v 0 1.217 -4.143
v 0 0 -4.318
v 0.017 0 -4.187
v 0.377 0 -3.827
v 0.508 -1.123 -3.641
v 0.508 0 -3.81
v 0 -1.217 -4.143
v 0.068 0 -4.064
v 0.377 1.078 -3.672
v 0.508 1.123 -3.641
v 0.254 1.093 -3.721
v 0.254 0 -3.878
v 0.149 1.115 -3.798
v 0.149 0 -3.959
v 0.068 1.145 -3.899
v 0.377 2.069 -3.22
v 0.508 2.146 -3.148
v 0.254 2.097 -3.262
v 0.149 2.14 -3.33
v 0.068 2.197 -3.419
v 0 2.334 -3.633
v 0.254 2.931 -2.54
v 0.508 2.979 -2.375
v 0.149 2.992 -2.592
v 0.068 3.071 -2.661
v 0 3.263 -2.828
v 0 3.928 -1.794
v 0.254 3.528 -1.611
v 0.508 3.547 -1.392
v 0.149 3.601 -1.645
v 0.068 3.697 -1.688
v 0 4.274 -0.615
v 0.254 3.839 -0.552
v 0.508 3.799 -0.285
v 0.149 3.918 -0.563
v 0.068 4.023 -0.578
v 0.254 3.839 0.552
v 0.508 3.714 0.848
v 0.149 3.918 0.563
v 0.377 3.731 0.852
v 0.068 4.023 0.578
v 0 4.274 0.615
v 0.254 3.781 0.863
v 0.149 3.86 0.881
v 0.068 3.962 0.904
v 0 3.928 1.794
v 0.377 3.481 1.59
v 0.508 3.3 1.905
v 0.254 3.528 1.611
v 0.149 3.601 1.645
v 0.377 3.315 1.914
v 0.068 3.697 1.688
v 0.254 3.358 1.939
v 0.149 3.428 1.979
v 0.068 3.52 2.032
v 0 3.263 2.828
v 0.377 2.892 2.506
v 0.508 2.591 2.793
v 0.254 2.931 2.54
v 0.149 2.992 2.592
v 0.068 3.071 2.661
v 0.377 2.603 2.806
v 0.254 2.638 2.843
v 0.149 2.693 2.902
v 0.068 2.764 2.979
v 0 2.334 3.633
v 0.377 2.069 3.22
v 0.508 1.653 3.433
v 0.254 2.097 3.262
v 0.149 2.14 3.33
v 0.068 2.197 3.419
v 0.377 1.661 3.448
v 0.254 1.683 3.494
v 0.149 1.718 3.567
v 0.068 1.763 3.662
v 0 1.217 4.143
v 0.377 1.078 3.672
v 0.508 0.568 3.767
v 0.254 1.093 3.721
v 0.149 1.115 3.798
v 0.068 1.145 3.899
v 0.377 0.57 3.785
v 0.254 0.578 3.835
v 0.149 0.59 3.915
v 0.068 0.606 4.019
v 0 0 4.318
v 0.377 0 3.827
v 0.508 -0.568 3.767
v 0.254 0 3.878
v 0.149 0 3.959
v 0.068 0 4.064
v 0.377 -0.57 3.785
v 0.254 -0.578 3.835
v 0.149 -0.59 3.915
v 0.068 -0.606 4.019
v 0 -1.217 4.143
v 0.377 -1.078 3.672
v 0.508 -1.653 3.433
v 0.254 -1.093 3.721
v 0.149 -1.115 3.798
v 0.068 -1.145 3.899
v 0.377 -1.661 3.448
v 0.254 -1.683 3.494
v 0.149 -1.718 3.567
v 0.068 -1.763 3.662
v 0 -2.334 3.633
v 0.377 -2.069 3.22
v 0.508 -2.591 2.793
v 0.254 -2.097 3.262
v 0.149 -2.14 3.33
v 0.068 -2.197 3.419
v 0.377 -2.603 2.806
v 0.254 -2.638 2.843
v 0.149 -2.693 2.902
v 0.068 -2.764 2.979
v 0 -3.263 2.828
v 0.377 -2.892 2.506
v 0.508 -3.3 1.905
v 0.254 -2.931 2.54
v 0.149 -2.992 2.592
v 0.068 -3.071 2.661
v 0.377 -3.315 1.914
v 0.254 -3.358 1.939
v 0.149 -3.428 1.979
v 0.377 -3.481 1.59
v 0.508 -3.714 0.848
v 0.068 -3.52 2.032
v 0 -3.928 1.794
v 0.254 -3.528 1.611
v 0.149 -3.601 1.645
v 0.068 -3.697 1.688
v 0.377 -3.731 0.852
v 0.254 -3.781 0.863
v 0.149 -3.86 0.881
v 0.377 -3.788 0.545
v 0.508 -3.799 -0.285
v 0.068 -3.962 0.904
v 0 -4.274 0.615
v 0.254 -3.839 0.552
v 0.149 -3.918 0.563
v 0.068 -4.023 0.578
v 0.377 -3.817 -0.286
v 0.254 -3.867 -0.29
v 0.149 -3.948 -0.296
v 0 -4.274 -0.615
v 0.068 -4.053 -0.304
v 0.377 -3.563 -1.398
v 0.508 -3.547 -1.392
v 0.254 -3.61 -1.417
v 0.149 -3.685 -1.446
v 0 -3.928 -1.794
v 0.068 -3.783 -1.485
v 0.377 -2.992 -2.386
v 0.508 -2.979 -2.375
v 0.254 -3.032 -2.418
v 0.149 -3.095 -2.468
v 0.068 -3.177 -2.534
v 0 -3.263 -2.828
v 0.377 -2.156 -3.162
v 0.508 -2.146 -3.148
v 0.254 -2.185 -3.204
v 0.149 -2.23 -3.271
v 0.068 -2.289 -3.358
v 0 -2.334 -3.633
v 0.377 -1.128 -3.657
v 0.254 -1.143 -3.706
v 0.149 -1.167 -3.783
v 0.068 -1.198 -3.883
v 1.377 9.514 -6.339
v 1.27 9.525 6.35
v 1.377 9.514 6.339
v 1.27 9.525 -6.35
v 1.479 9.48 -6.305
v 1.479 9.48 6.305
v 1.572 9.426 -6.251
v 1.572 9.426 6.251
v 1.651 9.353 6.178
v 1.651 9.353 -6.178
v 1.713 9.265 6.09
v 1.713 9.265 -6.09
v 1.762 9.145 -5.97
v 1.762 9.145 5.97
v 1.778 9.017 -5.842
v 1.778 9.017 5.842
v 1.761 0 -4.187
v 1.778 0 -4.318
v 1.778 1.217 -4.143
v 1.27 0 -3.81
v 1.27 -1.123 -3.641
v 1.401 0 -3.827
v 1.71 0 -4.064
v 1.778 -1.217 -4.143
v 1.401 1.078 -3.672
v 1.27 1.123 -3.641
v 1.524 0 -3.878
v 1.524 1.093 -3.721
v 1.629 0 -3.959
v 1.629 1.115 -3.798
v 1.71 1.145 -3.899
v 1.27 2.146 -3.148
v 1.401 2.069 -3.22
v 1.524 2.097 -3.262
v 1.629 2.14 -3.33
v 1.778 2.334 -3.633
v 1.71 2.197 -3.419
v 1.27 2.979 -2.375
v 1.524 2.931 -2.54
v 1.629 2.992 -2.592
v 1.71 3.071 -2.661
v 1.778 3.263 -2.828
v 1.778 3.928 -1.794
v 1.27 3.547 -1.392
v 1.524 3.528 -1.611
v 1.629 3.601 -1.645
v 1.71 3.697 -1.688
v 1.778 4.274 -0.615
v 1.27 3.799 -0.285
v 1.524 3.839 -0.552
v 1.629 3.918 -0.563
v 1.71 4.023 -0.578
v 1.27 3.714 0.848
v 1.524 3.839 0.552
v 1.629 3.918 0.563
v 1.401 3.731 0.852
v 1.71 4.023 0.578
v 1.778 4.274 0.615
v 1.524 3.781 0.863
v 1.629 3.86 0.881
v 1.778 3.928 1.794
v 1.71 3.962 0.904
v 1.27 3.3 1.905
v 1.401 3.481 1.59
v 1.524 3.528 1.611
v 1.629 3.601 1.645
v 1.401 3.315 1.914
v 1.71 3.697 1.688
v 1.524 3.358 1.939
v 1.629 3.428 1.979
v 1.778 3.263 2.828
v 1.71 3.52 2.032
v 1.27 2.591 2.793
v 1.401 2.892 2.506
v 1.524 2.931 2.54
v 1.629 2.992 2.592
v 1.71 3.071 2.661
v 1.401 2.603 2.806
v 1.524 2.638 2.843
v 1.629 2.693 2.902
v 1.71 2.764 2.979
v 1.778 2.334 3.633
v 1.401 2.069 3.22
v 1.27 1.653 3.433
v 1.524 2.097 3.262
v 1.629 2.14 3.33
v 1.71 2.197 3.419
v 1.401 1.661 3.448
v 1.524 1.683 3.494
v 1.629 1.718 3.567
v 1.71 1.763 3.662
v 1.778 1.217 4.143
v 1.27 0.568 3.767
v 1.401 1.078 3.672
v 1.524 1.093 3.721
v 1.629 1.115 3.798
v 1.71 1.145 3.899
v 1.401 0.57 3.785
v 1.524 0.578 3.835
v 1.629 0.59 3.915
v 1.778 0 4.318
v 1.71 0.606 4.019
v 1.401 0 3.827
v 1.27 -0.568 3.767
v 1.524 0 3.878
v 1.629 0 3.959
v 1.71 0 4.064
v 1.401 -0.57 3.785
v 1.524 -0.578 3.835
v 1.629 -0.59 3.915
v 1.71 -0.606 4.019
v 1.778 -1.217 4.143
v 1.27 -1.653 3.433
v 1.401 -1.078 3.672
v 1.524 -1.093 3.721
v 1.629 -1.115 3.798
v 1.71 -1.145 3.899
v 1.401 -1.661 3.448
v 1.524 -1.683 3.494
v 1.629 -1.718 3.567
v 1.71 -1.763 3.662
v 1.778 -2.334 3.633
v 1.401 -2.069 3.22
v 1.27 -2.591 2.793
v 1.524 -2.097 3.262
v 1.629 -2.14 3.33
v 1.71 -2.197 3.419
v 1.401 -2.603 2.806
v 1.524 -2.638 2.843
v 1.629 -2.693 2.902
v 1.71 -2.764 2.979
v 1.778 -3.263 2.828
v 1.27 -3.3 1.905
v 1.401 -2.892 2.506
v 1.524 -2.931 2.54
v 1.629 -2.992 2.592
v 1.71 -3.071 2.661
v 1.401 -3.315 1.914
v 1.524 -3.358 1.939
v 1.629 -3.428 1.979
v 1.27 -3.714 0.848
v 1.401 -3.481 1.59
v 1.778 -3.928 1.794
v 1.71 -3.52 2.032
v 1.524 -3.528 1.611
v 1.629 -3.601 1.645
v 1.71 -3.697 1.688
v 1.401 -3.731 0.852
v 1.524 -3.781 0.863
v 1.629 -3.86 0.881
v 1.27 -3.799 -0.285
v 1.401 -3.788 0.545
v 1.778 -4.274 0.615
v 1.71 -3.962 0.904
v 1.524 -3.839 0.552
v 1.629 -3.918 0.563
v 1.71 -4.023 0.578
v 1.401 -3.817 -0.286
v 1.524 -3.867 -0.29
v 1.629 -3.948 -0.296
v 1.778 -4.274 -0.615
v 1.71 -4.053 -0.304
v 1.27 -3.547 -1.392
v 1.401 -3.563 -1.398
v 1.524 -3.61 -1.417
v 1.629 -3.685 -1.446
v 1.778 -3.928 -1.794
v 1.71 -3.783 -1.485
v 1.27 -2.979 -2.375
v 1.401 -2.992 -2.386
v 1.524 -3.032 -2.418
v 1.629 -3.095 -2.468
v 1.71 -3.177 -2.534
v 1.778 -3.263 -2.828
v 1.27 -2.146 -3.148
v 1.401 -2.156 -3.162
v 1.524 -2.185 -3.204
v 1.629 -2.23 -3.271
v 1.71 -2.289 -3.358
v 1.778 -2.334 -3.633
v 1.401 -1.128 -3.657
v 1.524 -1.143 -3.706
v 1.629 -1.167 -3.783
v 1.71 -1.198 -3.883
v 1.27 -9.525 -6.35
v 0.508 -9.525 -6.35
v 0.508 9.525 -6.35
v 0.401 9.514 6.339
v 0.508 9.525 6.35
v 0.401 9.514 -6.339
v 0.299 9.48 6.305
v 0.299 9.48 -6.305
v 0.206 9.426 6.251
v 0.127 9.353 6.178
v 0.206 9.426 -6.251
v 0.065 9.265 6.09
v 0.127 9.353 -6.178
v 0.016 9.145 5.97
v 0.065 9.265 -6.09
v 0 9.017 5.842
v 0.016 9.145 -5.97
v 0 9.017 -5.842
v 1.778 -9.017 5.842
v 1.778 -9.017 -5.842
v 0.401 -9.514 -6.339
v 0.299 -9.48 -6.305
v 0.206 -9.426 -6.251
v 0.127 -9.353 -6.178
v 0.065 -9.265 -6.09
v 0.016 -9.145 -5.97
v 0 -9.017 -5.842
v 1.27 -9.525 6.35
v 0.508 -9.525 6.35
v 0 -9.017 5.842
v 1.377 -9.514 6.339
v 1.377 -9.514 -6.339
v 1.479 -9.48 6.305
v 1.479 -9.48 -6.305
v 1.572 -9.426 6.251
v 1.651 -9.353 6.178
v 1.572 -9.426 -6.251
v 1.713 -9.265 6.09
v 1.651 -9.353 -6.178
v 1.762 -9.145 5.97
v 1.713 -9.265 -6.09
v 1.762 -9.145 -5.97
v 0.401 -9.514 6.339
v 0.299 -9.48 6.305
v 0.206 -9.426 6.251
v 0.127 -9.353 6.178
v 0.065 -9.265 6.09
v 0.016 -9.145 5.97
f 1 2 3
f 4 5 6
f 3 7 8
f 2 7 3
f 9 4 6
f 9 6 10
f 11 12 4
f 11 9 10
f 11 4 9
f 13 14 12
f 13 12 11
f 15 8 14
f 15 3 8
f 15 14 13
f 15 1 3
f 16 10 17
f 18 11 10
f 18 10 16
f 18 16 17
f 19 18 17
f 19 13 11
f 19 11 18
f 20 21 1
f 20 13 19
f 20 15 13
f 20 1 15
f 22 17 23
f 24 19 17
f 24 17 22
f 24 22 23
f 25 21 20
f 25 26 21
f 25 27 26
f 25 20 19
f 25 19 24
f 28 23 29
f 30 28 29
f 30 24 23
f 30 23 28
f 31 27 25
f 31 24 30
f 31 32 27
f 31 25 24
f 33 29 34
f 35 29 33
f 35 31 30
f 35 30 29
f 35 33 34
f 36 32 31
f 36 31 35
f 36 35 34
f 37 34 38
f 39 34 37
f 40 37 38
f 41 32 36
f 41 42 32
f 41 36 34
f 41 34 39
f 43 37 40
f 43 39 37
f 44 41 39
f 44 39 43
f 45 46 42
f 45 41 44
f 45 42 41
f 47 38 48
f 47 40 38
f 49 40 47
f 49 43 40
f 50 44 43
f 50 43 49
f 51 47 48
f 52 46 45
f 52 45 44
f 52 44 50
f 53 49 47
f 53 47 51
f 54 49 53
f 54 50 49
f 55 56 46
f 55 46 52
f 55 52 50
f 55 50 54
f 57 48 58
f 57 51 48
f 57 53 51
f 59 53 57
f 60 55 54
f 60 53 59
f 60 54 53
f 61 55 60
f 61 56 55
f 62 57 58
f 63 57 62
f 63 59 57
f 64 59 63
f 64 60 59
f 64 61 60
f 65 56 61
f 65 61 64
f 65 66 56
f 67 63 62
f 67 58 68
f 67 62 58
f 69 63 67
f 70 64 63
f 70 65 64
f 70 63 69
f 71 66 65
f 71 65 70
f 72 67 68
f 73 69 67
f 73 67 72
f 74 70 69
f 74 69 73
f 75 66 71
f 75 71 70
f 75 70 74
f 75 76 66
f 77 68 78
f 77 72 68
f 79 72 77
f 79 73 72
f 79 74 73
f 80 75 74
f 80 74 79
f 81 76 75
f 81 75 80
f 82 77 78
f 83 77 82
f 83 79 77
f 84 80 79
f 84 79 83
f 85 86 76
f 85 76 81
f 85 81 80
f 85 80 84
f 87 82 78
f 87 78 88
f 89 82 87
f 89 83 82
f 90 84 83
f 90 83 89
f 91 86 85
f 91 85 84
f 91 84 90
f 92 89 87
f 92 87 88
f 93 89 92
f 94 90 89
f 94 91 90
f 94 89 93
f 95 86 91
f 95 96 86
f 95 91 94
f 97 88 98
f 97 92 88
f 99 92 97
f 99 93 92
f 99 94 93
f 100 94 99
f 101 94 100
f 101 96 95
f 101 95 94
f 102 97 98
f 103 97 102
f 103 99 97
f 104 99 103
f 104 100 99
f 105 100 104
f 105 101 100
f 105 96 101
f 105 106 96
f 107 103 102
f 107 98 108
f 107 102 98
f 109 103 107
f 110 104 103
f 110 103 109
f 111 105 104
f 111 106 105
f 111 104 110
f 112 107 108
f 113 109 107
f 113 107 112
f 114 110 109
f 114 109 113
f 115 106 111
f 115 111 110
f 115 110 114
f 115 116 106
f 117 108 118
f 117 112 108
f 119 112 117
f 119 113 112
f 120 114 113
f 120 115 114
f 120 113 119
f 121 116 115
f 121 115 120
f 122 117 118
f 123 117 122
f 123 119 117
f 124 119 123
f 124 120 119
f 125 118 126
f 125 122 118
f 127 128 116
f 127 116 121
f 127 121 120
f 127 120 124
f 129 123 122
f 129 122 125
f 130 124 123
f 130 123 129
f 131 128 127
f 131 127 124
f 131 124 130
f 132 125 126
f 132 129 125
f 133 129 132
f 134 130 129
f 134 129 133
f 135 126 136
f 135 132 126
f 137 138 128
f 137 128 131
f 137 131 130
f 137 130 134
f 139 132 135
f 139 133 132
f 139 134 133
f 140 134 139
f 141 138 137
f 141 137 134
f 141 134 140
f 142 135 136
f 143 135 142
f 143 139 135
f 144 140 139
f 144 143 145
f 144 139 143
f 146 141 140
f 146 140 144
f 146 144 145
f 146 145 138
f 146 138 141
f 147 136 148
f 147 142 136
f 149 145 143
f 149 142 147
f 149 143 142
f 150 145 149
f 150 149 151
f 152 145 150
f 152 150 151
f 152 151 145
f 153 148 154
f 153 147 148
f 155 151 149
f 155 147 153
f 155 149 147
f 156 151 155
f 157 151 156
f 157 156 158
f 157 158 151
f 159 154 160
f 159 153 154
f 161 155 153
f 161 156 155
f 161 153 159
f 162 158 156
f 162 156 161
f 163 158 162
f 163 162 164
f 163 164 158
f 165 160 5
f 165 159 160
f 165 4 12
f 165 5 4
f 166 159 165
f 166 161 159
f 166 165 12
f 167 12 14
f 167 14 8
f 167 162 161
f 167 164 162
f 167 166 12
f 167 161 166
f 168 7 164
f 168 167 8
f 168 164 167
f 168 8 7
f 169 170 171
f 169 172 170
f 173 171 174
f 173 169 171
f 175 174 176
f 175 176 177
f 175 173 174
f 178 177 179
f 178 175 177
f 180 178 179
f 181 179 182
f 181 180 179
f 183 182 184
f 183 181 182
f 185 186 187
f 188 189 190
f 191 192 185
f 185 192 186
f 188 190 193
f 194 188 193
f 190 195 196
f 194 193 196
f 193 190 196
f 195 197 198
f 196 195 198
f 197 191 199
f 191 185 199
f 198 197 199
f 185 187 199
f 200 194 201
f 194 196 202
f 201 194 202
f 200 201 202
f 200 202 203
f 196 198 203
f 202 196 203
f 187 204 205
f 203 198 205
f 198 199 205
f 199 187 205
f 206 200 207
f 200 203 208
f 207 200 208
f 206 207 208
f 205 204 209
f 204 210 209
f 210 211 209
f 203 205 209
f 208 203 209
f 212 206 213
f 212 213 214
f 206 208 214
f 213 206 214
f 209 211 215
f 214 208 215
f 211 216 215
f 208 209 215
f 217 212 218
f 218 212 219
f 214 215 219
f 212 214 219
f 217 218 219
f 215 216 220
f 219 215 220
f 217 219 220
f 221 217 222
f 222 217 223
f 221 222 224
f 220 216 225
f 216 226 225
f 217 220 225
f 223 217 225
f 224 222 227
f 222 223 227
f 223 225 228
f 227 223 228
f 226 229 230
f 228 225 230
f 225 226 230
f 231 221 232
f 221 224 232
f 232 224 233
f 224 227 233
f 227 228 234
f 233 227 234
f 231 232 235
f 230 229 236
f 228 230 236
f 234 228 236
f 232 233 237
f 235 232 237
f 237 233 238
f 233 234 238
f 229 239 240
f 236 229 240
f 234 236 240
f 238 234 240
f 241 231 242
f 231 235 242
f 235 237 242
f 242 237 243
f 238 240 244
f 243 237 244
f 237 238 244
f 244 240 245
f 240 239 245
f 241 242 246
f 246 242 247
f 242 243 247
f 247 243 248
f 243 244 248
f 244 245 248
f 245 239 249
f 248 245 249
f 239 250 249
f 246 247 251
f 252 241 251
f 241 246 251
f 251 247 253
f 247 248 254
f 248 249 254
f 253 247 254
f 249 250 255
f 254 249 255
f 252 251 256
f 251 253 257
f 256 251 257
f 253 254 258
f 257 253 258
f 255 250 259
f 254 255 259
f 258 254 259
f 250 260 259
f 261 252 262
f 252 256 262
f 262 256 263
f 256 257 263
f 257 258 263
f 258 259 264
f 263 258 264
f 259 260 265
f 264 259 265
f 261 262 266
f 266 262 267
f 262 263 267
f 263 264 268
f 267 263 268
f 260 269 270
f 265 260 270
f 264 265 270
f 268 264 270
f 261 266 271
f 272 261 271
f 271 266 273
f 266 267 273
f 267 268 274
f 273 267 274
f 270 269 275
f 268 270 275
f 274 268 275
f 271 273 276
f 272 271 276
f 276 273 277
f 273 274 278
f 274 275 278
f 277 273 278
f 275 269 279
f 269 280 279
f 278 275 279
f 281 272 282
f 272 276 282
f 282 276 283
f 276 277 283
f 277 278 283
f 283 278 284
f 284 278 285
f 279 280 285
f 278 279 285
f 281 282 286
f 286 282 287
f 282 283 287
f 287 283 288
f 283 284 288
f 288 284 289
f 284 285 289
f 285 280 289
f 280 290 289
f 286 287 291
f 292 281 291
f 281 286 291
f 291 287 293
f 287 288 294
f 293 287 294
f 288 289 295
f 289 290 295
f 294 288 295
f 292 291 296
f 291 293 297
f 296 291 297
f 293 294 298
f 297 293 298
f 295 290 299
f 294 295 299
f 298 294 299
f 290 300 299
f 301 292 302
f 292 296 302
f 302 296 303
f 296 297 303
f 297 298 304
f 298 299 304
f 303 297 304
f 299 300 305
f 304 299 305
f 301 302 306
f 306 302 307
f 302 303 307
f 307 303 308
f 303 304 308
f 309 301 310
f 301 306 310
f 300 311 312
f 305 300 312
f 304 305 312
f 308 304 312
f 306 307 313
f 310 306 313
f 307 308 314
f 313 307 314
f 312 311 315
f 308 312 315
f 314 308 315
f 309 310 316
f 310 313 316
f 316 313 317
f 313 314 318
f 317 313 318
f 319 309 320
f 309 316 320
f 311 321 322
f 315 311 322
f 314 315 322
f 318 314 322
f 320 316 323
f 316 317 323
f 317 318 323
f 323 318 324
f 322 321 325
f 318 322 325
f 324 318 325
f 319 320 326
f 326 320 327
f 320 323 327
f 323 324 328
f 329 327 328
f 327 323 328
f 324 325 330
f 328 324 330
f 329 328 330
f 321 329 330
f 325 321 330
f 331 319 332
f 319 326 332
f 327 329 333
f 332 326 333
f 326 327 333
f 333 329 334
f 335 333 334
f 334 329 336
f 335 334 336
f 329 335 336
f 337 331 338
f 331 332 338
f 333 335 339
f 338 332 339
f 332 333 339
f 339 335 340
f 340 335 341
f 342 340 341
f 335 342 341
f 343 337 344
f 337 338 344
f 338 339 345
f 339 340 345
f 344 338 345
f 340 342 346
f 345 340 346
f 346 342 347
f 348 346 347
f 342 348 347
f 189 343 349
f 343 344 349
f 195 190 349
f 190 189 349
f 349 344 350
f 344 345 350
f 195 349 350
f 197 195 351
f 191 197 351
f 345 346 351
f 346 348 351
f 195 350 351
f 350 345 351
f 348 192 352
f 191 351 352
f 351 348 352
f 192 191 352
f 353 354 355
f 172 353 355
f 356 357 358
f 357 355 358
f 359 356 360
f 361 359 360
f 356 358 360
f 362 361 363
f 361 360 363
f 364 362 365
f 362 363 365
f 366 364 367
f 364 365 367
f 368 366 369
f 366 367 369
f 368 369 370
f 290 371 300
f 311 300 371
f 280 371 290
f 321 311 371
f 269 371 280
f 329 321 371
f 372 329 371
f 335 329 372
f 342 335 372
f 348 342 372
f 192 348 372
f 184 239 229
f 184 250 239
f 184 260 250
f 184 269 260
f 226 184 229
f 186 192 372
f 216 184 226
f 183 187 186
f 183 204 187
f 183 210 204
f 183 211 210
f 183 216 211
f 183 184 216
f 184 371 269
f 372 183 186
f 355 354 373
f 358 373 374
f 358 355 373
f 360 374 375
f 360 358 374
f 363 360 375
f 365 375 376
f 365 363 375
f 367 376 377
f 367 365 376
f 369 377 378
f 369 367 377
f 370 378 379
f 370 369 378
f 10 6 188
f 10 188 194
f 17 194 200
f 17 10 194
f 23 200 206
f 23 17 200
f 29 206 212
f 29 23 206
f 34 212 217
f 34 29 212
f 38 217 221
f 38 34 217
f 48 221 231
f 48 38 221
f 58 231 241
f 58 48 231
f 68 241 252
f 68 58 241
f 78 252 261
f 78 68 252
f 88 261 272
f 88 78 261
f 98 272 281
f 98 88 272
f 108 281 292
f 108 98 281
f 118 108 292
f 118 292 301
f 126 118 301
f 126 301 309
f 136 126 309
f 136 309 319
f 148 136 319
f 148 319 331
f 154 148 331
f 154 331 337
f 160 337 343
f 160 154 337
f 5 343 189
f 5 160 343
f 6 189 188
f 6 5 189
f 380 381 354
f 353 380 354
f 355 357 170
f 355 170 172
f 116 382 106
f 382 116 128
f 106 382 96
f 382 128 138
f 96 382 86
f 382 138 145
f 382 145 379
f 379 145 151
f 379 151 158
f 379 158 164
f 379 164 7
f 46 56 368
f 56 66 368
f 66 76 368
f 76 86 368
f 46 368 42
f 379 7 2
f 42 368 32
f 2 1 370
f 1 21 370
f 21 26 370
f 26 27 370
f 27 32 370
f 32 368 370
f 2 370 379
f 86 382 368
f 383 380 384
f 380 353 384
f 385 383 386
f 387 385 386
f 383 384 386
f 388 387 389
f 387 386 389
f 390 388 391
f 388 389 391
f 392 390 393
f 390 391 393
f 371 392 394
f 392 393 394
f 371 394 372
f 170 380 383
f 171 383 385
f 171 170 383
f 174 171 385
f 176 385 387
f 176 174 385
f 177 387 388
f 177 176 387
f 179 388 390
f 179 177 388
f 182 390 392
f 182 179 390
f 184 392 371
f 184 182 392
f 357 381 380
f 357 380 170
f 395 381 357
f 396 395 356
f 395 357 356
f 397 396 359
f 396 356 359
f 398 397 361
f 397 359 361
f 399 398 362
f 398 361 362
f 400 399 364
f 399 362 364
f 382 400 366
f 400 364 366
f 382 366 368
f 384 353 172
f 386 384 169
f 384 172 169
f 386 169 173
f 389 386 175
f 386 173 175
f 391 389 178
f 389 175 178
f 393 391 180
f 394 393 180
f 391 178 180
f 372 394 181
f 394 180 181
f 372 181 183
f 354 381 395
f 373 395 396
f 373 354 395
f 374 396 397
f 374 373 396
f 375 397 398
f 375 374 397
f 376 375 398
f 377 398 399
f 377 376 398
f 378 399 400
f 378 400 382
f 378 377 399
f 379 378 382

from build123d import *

# Parameters (mm, degrees)
SKETCH1_W           = 12.7
SKETCH1_H           = 19.05
SKETCH1_R           = 3.81
BOSS_EXTRUDE1_DEPTH = 1.778
FILLET1_R           = 0.508


with BuildPart() as part:
    # Sketch1 → Boss-Extrude1 (new body)
    with BuildSketch(Plane(origin=(0, 0, 0), x_dir=(0, 0, -1), z_dir=(1, 0, 0))):
        Rectangle(SKETCH1_W, SKETCH1_H)
        Circle(SKETCH1_R, mode=Mode.SUBTRACT)
    extrude(amount=BOSS_EXTRUDE1_DEPTH)

    # Fillet1
    fillet1_edges = [part.edges().sort_by_distance(p)[0] for p in [
        (0, 0, 3.81),
        (1.778, 0, 3.81),
        (1.778, 0, 6.35),
        (1.778, -9.525, 0),
        (1.778, 0, -6.35),
        (0, -9.525, 0),
        (0, 0, 6.35),
        (0, 9.525, 0),
        (0, 0, -6.35),
        (1.778, 9.525, 0),
    ]]
    fillet(fillet1_edges, radius=FILLET1_R)


solid = part.part
